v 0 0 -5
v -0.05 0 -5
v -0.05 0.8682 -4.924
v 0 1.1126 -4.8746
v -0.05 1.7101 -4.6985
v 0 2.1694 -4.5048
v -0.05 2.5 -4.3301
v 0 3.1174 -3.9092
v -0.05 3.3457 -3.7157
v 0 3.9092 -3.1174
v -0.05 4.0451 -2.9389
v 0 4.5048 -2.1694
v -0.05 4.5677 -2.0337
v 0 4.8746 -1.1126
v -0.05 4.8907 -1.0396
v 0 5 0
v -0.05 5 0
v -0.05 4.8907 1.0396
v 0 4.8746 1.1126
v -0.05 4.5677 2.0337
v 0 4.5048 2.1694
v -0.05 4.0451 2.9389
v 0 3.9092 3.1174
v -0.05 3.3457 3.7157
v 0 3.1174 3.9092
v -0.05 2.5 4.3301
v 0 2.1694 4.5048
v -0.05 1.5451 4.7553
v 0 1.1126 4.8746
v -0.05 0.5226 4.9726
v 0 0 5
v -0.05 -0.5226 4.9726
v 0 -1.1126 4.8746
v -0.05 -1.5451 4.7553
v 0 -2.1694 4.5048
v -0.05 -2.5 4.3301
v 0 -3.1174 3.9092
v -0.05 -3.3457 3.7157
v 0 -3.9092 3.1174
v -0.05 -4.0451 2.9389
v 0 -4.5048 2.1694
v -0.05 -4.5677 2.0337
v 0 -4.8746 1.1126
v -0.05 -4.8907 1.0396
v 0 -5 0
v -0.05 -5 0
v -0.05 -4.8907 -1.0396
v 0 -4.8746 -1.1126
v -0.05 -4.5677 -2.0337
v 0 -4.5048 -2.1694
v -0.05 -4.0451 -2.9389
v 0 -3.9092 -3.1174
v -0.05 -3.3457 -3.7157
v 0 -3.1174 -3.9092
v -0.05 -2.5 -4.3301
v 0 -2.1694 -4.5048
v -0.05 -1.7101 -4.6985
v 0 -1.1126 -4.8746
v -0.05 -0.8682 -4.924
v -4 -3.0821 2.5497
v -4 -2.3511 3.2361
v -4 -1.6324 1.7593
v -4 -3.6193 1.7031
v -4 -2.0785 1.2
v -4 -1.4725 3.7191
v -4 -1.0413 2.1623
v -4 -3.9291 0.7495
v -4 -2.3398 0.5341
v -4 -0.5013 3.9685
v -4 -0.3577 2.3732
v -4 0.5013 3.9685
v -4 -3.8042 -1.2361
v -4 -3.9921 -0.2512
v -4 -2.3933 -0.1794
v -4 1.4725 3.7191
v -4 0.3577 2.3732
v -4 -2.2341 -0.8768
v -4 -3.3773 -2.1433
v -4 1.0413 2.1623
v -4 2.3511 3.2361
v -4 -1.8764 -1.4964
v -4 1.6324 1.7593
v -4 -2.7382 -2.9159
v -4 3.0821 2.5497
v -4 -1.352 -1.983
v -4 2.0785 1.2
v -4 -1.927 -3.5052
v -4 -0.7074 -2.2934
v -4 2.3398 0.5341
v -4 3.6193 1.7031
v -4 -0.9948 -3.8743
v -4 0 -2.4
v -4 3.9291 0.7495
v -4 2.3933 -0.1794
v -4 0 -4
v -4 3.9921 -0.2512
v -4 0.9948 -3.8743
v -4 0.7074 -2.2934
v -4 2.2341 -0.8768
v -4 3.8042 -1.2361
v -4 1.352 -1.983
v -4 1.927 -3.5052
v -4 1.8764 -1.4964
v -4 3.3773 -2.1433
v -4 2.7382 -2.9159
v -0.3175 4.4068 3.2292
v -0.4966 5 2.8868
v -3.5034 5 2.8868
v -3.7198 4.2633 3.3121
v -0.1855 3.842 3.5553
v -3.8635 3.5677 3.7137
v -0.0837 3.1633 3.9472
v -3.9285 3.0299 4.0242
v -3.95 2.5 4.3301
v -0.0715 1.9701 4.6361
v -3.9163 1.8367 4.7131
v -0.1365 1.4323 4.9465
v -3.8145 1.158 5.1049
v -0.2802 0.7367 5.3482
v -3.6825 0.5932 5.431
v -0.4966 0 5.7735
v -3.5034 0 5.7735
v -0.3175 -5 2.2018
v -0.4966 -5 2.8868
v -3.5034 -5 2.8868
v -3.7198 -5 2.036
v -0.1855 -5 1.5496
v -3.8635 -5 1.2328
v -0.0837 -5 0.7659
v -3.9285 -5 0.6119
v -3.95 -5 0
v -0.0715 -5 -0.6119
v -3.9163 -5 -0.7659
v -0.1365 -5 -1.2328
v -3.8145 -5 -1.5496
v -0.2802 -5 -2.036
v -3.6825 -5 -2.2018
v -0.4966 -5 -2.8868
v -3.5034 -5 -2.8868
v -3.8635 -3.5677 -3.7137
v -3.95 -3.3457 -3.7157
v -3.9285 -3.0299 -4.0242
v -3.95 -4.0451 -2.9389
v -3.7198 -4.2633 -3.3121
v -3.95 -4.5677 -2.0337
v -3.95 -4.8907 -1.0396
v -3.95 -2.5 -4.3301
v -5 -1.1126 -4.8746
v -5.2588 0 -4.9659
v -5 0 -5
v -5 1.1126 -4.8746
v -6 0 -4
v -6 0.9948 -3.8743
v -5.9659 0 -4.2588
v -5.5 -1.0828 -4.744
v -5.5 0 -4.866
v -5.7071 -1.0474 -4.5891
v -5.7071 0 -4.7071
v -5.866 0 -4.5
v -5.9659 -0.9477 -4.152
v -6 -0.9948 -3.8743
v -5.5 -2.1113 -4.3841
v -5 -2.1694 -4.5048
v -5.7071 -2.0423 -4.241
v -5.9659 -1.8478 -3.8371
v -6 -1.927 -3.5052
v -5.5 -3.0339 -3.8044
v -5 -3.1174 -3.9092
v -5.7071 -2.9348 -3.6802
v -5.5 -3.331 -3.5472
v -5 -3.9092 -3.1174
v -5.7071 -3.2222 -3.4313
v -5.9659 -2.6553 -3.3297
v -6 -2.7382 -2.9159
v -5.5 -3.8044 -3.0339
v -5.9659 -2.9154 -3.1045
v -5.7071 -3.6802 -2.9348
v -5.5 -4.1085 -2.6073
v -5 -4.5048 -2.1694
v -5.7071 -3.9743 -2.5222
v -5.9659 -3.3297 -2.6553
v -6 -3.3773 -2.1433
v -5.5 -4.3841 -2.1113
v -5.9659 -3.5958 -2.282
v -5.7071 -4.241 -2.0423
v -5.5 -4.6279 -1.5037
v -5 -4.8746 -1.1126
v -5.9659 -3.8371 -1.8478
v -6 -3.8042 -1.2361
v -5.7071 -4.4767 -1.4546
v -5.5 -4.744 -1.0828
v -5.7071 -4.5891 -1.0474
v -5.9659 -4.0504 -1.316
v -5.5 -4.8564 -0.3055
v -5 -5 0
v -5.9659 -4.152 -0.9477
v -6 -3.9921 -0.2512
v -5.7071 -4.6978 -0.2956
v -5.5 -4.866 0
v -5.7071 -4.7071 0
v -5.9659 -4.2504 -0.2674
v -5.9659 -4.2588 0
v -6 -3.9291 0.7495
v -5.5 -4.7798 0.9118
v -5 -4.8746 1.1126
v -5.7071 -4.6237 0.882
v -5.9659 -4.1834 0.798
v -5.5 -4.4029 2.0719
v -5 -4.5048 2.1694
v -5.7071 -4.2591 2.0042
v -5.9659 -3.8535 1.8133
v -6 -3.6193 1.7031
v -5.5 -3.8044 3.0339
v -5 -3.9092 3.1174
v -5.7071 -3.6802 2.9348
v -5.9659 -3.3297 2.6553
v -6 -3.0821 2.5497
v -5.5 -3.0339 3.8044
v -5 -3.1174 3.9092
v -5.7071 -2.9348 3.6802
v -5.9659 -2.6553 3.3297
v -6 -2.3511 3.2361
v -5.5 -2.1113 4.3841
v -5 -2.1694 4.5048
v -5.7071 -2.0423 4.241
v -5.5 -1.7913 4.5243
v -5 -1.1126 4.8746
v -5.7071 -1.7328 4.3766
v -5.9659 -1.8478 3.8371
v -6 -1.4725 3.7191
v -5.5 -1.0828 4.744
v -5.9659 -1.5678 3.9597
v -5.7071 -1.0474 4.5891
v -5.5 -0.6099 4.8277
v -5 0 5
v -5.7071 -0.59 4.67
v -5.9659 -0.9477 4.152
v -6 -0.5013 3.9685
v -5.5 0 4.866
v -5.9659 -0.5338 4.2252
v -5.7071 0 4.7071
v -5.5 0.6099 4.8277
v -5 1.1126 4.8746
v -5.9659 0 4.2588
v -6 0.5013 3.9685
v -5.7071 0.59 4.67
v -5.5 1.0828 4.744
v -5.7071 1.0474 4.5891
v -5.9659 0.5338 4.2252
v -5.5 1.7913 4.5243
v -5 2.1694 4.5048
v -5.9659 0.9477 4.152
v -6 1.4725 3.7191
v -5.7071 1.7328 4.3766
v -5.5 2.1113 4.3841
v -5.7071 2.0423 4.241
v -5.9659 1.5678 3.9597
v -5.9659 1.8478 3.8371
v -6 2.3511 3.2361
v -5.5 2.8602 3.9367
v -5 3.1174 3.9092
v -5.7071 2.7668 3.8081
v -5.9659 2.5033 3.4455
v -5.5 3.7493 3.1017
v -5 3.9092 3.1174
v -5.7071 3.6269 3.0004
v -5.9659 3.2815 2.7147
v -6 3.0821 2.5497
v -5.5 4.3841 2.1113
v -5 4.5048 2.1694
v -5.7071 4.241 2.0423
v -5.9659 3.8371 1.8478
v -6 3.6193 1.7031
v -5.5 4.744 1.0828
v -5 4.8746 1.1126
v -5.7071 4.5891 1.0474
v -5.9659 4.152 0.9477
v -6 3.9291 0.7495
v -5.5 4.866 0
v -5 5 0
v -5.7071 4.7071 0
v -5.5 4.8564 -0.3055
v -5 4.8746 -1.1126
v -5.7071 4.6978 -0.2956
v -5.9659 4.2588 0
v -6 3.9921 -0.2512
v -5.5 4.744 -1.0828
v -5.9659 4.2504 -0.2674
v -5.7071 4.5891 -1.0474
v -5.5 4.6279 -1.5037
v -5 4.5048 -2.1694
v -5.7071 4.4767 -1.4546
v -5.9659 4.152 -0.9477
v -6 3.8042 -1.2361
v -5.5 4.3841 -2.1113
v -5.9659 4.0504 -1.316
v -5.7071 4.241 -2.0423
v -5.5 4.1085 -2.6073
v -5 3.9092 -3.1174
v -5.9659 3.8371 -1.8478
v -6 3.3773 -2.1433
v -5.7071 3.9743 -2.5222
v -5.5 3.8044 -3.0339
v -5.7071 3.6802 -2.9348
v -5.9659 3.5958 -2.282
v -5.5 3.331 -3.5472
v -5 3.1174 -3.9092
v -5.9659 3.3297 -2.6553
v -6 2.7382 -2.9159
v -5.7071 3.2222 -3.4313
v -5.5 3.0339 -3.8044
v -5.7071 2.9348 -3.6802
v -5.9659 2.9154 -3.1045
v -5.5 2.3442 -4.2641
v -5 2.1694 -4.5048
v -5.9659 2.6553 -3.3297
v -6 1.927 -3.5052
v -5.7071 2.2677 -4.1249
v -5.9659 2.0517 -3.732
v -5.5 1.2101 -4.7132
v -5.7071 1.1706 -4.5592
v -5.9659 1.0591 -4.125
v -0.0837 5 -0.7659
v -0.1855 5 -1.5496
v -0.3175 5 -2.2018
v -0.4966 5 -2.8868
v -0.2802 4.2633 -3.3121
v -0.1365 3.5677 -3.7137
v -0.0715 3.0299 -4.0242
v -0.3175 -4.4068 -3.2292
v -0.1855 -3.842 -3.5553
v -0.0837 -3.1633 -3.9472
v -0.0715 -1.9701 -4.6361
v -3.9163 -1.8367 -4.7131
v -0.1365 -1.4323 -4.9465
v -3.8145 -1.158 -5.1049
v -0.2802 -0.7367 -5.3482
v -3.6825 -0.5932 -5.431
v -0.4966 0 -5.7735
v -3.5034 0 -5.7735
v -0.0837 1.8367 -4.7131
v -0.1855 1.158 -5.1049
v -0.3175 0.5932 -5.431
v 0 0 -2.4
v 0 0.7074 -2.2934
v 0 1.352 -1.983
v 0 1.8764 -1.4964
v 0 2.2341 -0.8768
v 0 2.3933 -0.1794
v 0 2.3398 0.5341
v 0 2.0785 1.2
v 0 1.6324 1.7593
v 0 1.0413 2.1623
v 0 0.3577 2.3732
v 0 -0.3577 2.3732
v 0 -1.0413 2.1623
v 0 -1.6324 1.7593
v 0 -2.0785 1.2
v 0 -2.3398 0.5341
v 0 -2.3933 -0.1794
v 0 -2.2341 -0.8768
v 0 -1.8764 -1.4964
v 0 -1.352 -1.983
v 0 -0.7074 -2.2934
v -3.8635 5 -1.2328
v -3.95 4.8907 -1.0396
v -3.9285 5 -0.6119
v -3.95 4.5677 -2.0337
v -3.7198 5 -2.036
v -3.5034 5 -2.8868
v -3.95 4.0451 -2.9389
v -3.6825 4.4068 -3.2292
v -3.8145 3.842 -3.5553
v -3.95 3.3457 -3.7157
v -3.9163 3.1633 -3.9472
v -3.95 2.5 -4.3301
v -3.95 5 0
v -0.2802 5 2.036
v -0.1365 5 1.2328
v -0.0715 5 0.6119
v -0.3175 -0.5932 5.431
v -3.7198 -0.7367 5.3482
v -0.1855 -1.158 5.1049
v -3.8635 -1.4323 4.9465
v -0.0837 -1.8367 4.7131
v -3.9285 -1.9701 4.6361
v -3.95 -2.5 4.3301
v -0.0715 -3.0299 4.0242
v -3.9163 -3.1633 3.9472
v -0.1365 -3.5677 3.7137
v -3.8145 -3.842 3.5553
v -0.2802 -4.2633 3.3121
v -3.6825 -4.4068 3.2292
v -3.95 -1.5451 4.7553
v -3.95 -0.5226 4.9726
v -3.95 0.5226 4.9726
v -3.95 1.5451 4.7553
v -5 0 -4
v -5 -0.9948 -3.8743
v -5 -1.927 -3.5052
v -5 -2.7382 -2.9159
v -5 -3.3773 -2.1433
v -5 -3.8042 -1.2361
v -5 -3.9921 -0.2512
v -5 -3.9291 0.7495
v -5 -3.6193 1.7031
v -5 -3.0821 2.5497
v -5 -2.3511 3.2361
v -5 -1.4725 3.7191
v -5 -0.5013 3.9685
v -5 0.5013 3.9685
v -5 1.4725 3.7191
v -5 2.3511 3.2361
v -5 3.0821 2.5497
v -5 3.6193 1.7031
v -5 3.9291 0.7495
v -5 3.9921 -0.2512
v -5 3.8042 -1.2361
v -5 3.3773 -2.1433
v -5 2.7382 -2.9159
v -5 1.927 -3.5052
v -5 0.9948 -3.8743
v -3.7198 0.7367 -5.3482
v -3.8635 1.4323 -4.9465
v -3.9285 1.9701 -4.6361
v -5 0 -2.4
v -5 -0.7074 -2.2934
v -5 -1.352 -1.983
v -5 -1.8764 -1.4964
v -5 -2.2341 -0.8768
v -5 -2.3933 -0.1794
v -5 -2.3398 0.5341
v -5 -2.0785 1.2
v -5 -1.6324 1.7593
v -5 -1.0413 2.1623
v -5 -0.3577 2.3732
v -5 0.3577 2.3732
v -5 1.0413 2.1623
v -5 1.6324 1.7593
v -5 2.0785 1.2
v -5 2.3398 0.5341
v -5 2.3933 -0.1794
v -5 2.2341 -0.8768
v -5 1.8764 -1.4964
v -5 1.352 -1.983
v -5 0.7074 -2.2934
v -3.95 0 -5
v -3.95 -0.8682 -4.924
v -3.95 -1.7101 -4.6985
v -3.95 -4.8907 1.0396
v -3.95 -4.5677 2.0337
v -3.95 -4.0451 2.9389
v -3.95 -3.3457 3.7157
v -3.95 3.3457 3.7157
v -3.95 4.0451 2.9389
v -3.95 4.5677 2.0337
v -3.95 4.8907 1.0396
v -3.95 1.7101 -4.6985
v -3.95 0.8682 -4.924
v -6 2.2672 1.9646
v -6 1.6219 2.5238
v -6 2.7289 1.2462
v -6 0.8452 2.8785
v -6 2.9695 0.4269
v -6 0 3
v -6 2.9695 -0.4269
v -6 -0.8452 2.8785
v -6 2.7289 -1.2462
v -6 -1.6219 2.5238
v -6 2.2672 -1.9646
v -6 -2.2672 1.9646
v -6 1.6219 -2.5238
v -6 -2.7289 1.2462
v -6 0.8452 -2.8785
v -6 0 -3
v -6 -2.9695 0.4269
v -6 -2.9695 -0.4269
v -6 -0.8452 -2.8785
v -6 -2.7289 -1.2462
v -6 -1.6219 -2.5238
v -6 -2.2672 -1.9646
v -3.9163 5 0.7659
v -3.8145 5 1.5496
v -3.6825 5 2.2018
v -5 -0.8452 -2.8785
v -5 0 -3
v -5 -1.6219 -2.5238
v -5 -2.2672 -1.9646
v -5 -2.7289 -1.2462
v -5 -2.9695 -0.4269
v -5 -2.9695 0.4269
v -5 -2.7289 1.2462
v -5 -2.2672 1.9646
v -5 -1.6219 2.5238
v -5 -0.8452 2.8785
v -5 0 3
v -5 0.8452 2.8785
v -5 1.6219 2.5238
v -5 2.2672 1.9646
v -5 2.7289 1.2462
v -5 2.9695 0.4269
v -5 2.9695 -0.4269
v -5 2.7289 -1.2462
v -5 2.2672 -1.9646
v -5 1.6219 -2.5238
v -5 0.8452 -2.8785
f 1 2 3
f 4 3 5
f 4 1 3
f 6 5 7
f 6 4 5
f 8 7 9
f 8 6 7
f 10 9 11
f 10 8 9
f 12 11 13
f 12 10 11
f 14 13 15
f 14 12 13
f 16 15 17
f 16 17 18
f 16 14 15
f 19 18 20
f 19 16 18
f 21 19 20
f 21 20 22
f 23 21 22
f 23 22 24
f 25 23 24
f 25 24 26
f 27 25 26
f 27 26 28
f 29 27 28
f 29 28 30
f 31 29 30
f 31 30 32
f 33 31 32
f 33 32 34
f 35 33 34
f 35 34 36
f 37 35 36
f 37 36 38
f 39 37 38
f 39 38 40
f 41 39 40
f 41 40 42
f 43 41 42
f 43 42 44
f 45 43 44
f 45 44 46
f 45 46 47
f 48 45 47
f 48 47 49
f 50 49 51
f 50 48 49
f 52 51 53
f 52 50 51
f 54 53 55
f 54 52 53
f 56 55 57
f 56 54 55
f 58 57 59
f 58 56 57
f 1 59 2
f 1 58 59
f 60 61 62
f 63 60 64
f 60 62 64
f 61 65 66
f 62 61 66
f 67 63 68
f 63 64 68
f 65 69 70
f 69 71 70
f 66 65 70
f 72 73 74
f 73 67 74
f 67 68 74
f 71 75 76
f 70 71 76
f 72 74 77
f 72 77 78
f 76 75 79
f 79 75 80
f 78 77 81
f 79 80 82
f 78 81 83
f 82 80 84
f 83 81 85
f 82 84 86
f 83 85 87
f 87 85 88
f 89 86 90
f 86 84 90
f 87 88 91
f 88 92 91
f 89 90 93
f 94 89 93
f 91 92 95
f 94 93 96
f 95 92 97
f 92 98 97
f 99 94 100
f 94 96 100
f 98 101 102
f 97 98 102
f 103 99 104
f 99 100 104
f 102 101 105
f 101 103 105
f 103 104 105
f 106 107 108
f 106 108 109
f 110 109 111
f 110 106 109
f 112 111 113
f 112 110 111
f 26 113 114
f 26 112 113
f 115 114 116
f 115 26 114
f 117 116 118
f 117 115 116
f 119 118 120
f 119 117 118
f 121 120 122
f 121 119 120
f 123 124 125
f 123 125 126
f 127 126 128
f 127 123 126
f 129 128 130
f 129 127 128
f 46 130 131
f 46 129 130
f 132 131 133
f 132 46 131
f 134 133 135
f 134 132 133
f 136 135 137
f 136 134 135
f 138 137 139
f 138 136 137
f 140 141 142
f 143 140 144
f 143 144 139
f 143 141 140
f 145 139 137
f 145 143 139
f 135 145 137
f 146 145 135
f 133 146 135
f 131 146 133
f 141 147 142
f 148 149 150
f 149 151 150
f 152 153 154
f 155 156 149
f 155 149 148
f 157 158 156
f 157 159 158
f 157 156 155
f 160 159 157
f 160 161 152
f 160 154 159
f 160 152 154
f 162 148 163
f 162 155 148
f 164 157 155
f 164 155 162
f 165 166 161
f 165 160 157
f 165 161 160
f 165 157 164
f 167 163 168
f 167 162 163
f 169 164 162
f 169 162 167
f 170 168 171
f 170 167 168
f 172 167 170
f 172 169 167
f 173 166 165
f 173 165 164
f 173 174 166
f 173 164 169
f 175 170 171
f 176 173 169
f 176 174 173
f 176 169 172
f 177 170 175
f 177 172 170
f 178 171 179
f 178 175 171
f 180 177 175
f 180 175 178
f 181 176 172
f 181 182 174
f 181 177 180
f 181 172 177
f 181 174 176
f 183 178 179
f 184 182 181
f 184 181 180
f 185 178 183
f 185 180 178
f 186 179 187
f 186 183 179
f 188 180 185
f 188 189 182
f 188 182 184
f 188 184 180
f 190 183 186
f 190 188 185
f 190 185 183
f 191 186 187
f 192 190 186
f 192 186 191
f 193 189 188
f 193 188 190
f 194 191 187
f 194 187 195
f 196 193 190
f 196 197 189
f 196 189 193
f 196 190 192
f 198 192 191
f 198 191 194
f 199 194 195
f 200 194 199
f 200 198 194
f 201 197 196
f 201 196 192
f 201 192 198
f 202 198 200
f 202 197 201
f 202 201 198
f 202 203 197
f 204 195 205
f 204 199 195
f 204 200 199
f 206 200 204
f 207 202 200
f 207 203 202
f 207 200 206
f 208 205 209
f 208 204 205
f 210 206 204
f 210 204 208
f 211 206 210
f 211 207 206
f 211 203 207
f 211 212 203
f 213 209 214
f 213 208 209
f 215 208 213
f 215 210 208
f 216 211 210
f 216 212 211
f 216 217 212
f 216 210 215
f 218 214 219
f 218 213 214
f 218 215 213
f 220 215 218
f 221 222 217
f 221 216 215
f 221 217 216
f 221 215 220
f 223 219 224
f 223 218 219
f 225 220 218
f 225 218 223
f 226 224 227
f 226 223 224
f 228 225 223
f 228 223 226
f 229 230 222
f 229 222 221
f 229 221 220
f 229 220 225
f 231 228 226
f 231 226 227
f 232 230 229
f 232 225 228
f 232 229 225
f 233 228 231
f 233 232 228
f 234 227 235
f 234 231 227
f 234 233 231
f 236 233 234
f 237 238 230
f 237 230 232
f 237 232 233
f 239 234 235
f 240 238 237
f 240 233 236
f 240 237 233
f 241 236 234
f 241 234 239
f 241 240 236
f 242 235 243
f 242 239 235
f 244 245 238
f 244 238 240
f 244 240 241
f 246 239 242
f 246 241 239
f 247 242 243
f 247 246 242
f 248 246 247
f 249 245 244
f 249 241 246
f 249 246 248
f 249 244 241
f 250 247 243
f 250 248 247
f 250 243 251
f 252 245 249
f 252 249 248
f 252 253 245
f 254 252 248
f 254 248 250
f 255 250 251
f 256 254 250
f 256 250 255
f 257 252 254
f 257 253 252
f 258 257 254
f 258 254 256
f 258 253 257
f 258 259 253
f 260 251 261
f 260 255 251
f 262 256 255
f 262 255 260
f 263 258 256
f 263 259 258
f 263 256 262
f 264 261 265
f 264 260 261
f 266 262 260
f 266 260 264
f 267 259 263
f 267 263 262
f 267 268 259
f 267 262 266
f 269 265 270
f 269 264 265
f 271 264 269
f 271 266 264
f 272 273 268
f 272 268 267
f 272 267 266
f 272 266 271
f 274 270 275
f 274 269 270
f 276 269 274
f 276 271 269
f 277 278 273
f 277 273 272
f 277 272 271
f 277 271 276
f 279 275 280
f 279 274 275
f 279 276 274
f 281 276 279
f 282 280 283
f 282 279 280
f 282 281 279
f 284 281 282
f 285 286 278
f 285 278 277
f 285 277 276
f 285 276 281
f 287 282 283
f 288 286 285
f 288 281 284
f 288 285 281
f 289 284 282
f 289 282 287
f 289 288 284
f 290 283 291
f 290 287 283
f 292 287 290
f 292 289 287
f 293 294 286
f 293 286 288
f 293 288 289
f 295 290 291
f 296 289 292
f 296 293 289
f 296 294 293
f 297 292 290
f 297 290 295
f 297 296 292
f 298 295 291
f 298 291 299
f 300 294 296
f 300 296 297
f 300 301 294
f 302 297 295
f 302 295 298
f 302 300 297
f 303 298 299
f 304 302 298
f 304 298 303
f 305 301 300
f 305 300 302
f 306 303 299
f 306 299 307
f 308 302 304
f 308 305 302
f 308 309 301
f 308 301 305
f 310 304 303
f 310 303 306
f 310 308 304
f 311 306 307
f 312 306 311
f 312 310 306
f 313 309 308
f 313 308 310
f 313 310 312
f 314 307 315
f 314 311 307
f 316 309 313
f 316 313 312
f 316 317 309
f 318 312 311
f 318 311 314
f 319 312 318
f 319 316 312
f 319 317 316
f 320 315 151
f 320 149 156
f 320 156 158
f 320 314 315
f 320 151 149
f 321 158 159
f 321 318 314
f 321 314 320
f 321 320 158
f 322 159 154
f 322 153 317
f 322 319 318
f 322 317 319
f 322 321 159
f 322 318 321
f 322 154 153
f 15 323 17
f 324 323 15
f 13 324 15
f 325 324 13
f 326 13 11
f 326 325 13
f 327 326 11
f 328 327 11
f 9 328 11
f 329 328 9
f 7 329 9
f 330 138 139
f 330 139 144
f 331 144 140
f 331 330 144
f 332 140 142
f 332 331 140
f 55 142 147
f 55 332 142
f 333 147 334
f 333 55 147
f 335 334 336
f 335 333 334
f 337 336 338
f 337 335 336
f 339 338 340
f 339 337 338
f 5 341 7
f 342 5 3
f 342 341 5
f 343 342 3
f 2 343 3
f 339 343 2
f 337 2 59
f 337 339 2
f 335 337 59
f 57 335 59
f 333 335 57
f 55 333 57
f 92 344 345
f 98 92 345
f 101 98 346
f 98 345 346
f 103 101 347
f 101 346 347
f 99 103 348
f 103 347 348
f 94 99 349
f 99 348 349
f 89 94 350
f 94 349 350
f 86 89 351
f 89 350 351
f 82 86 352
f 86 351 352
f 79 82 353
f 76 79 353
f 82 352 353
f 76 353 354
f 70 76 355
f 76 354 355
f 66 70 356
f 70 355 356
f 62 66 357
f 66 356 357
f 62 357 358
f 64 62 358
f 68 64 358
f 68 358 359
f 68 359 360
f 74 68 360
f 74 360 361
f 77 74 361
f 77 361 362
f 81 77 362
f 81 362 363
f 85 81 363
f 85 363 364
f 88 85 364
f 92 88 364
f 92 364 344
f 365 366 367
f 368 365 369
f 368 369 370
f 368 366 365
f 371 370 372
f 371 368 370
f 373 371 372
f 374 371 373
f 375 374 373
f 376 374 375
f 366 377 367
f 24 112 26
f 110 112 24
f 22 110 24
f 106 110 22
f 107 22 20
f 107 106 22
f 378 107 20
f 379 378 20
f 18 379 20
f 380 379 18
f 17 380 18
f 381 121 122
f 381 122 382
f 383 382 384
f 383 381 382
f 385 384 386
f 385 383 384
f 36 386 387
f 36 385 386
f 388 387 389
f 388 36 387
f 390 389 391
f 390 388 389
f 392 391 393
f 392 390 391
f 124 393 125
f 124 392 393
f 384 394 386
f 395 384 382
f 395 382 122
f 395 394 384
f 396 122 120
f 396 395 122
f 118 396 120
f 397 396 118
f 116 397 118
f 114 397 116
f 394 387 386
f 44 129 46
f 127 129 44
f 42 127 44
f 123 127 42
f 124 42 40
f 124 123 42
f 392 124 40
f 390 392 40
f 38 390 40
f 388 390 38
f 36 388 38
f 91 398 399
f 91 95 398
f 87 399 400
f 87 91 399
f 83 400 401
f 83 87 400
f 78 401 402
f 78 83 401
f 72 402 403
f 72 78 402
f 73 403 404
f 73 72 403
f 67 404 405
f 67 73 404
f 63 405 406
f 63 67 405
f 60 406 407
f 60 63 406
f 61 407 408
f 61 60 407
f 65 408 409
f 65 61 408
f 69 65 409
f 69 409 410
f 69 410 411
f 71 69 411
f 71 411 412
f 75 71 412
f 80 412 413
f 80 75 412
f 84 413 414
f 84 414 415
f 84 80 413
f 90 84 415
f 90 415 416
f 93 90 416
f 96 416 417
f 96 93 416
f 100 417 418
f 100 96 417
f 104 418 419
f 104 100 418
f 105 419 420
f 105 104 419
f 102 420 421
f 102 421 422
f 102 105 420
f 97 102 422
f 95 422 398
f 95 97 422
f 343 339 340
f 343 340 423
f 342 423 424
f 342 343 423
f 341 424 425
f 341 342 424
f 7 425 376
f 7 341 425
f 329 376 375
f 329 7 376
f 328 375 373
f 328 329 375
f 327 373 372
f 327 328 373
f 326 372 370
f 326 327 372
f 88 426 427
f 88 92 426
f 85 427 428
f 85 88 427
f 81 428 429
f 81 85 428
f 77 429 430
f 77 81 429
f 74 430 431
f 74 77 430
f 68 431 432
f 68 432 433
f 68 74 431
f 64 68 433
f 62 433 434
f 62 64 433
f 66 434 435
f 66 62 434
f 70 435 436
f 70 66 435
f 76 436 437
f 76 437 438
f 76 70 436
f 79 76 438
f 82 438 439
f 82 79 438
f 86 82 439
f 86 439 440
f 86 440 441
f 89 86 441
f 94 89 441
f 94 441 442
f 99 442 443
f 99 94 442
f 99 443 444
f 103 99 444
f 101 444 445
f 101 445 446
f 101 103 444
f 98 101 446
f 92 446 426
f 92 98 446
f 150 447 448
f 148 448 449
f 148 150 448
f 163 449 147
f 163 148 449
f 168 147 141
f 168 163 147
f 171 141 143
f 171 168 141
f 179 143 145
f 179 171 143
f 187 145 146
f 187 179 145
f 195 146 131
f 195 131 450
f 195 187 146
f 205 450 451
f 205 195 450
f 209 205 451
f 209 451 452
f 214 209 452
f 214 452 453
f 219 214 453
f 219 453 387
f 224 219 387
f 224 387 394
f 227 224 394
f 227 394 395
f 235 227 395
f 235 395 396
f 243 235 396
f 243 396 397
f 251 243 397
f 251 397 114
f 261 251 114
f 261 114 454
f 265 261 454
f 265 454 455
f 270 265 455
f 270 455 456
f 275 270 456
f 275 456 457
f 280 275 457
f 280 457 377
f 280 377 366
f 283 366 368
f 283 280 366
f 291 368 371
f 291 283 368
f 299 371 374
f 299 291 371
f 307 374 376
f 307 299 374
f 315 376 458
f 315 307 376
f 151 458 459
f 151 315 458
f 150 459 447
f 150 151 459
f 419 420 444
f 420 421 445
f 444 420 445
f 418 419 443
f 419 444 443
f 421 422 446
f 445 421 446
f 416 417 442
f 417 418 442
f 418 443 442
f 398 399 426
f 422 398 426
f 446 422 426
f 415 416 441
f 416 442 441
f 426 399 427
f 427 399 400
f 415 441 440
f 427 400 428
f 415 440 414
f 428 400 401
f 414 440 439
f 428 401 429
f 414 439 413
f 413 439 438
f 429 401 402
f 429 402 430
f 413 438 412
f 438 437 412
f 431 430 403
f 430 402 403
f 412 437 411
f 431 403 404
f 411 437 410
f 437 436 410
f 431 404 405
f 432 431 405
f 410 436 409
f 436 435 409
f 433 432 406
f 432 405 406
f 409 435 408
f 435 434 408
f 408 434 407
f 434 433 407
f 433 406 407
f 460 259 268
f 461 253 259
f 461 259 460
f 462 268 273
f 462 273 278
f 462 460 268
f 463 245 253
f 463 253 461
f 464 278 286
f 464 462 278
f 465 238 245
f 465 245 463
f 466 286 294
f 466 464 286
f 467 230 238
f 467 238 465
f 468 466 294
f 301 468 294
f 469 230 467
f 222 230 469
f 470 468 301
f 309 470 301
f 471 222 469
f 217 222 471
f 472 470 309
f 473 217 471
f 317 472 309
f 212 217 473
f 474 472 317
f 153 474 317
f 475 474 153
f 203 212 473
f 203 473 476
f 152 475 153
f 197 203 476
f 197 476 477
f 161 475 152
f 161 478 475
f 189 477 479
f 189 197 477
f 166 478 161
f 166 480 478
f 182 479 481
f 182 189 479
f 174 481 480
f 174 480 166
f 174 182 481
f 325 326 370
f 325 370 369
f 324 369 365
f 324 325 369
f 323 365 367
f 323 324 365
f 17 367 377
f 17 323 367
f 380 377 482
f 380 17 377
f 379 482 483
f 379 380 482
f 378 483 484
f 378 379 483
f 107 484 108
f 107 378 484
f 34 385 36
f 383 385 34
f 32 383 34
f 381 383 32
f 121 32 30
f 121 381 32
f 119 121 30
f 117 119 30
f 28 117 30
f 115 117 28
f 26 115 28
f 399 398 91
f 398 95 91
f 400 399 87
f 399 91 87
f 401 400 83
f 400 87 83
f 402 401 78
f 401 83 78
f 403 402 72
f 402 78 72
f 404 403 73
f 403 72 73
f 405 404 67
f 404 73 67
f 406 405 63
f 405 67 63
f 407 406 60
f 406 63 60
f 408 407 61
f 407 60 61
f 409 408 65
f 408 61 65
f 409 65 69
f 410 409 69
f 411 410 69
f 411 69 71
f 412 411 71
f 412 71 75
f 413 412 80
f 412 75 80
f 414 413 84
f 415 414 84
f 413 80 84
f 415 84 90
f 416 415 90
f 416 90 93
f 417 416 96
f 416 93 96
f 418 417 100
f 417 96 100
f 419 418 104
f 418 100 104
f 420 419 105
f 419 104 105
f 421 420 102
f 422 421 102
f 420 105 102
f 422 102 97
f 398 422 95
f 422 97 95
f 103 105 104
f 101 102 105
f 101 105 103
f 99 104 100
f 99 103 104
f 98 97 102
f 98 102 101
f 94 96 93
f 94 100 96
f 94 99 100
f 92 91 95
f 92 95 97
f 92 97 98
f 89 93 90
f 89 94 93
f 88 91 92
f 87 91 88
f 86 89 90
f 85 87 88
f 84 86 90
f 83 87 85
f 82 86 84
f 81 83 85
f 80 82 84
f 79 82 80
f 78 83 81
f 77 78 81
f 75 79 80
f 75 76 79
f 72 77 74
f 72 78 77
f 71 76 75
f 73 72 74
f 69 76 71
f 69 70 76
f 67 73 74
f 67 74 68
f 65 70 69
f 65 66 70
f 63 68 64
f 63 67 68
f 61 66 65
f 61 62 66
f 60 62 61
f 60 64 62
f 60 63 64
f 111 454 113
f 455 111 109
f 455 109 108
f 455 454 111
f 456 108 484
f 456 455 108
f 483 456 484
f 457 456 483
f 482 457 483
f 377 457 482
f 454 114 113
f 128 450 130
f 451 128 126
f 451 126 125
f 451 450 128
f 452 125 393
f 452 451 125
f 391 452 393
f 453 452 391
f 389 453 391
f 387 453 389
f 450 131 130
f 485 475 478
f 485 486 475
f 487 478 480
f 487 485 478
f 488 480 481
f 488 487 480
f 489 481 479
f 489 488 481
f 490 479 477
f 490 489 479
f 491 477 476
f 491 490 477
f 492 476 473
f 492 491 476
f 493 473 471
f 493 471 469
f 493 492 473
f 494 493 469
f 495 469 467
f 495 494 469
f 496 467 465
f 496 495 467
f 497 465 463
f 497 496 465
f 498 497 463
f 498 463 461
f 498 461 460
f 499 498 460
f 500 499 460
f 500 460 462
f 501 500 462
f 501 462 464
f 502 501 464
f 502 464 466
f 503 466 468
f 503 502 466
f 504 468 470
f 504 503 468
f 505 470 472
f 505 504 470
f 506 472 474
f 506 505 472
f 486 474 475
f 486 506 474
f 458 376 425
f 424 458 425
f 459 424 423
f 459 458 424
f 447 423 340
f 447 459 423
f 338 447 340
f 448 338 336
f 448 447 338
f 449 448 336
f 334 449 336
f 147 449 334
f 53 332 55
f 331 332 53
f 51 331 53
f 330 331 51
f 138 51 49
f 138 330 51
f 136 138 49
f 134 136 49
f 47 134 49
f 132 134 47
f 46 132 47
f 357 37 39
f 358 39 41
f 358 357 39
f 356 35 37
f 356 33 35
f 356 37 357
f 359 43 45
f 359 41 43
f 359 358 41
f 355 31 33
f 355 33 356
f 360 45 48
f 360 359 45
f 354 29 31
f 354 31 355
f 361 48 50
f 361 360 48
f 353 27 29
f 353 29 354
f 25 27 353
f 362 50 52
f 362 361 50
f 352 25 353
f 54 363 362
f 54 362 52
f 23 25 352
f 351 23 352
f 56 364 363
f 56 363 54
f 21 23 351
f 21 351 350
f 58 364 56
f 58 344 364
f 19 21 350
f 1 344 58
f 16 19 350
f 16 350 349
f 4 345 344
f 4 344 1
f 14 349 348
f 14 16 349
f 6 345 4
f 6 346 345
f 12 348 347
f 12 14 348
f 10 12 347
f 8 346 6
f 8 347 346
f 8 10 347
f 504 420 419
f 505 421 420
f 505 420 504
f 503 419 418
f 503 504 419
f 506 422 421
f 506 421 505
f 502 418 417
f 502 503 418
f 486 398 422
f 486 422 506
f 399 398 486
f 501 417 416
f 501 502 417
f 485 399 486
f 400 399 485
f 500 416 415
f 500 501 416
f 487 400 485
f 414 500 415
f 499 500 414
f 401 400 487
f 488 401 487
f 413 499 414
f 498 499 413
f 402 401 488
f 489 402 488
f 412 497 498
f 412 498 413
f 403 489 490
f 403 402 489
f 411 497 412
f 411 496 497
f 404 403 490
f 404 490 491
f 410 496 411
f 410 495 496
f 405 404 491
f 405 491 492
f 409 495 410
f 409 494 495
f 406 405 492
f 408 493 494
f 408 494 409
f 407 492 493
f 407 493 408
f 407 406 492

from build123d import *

# Parameters (mm, degrees)
SKIZZE6_R               = 5
GRUNDK_RPER_DEPTH       = 4
SKIZZE14_R              = 8.377499075
SCHNITT_SECHSKANT_DEPTH = 5
SKIZZE13_R              = 2.4
GEWINDE_DEPTH           = 5
SKIZZE19_W              = 1
SKIZZE19_H              = 1.6


with BuildPart() as part:
    # Skizze6 → Grundkörper (new body)
    with BuildSketch(Plane(origin=(0, 0, 0), x_dir=(0, 0, -1), z_dir=(1, 0, 0))):
        Circle(SKIZZE6_R)
    extrude(amount=-GRUNDK_RPER_DEPTH)

    # Skizze17 → Rotation2 (revolve)
    with BuildSketch(Plane.XY, mode=Mode.PRIVATE) as rotation2_sk:
        Polygon((-0.05, 5), (-2, 8.377499075), (-3.95, 5), align=None)
    revolve(rotation2_sk.sketch.rotate(Axis((0, 0, 0), (-1, 0, 0)), 90), axis=Axis((0, 0, 0), (-1, 0, 0)))  # turned: the seam where the file's is

    # Skizze14 → Schnitt Sechskant (cut, through all)
    with BuildSketch(Plane(origin=(0, 0, 0), x_dir=(0, 0, -1), z_dir=(1, 0, 0))):
        Circle(SKIZZE14_R)
        Polygon((2.886751346, -5), (5.773502692, 0), (2.886751346, 5), (-2.886751346, 5), (-5.773502692, 0), (-2.886751346, -5), align=None, mode=Mode.SUBTRACT)
    extrude(amount=-SCHNITT_SECHSKANT_DEPTH, mode=Mode.SUBTRACT)

    # Skizze13 → Gewinde (cut, through all)
    with BuildSketch(Plane(origin=(0, 0, 0), x_dir=(0, 0, -1), z_dir=(1, 0, 0))):
        Circle(SKIZZE13_R)
    extrude(amount=-GEWINDE_DEPTH, mode=Mode.SUBTRACT)

    # Skizze18 → Sicherungsmutter Rotation3 (revolve)
    with BuildSketch(Plane.XY, mode=Mode.PRIVATE) as sicherungsmutter_rotation3_sk:
        with BuildLine():
            Line((-4, 5), (-5, 5))
            ThreePointArc((-5, 5), (-5.707106781, 4.707106781), (-6, 4))
            Line((-6, 4), (-6, 3))
            Line((-6, 3), (-5, 3))
            Line((-5, 3), (-5, 4))
            Line((-5, 4), (-4, 4))
            Line((-4, 4), (-4, 5))
        make_face()
    revolve(sicherungsmutter_rotation3_sk.sketch.rotate(Axis((0, 0, 0), (-1, 0, 0)), 90), axis=Axis((0, 0, 0), (-1, 0, 0)))  # turned: the seam where the file's is


with BuildPart() as body_2:
    # Skizze19 → Sicherungsmutter Rotation4 (revolve)
    with BuildSketch(Plane.XY, mode=Mode.PRIVATE) as sicherungsmutter_rotation4_sk:
        with Locations((-4.5, 3.2)):
            Rectangle(SKIZZE19_W, SKIZZE19_H)
    revolve(sicherungsmutter_rotation4_sk.sketch.rotate(Axis((0, 0, 0), (-1, 0, 0)), 90), axis=Axis((0, 0, 0), (-1, 0, 0)))  # turned: the seam where the file's is


solid = Compound([part.part, body_2.part])
